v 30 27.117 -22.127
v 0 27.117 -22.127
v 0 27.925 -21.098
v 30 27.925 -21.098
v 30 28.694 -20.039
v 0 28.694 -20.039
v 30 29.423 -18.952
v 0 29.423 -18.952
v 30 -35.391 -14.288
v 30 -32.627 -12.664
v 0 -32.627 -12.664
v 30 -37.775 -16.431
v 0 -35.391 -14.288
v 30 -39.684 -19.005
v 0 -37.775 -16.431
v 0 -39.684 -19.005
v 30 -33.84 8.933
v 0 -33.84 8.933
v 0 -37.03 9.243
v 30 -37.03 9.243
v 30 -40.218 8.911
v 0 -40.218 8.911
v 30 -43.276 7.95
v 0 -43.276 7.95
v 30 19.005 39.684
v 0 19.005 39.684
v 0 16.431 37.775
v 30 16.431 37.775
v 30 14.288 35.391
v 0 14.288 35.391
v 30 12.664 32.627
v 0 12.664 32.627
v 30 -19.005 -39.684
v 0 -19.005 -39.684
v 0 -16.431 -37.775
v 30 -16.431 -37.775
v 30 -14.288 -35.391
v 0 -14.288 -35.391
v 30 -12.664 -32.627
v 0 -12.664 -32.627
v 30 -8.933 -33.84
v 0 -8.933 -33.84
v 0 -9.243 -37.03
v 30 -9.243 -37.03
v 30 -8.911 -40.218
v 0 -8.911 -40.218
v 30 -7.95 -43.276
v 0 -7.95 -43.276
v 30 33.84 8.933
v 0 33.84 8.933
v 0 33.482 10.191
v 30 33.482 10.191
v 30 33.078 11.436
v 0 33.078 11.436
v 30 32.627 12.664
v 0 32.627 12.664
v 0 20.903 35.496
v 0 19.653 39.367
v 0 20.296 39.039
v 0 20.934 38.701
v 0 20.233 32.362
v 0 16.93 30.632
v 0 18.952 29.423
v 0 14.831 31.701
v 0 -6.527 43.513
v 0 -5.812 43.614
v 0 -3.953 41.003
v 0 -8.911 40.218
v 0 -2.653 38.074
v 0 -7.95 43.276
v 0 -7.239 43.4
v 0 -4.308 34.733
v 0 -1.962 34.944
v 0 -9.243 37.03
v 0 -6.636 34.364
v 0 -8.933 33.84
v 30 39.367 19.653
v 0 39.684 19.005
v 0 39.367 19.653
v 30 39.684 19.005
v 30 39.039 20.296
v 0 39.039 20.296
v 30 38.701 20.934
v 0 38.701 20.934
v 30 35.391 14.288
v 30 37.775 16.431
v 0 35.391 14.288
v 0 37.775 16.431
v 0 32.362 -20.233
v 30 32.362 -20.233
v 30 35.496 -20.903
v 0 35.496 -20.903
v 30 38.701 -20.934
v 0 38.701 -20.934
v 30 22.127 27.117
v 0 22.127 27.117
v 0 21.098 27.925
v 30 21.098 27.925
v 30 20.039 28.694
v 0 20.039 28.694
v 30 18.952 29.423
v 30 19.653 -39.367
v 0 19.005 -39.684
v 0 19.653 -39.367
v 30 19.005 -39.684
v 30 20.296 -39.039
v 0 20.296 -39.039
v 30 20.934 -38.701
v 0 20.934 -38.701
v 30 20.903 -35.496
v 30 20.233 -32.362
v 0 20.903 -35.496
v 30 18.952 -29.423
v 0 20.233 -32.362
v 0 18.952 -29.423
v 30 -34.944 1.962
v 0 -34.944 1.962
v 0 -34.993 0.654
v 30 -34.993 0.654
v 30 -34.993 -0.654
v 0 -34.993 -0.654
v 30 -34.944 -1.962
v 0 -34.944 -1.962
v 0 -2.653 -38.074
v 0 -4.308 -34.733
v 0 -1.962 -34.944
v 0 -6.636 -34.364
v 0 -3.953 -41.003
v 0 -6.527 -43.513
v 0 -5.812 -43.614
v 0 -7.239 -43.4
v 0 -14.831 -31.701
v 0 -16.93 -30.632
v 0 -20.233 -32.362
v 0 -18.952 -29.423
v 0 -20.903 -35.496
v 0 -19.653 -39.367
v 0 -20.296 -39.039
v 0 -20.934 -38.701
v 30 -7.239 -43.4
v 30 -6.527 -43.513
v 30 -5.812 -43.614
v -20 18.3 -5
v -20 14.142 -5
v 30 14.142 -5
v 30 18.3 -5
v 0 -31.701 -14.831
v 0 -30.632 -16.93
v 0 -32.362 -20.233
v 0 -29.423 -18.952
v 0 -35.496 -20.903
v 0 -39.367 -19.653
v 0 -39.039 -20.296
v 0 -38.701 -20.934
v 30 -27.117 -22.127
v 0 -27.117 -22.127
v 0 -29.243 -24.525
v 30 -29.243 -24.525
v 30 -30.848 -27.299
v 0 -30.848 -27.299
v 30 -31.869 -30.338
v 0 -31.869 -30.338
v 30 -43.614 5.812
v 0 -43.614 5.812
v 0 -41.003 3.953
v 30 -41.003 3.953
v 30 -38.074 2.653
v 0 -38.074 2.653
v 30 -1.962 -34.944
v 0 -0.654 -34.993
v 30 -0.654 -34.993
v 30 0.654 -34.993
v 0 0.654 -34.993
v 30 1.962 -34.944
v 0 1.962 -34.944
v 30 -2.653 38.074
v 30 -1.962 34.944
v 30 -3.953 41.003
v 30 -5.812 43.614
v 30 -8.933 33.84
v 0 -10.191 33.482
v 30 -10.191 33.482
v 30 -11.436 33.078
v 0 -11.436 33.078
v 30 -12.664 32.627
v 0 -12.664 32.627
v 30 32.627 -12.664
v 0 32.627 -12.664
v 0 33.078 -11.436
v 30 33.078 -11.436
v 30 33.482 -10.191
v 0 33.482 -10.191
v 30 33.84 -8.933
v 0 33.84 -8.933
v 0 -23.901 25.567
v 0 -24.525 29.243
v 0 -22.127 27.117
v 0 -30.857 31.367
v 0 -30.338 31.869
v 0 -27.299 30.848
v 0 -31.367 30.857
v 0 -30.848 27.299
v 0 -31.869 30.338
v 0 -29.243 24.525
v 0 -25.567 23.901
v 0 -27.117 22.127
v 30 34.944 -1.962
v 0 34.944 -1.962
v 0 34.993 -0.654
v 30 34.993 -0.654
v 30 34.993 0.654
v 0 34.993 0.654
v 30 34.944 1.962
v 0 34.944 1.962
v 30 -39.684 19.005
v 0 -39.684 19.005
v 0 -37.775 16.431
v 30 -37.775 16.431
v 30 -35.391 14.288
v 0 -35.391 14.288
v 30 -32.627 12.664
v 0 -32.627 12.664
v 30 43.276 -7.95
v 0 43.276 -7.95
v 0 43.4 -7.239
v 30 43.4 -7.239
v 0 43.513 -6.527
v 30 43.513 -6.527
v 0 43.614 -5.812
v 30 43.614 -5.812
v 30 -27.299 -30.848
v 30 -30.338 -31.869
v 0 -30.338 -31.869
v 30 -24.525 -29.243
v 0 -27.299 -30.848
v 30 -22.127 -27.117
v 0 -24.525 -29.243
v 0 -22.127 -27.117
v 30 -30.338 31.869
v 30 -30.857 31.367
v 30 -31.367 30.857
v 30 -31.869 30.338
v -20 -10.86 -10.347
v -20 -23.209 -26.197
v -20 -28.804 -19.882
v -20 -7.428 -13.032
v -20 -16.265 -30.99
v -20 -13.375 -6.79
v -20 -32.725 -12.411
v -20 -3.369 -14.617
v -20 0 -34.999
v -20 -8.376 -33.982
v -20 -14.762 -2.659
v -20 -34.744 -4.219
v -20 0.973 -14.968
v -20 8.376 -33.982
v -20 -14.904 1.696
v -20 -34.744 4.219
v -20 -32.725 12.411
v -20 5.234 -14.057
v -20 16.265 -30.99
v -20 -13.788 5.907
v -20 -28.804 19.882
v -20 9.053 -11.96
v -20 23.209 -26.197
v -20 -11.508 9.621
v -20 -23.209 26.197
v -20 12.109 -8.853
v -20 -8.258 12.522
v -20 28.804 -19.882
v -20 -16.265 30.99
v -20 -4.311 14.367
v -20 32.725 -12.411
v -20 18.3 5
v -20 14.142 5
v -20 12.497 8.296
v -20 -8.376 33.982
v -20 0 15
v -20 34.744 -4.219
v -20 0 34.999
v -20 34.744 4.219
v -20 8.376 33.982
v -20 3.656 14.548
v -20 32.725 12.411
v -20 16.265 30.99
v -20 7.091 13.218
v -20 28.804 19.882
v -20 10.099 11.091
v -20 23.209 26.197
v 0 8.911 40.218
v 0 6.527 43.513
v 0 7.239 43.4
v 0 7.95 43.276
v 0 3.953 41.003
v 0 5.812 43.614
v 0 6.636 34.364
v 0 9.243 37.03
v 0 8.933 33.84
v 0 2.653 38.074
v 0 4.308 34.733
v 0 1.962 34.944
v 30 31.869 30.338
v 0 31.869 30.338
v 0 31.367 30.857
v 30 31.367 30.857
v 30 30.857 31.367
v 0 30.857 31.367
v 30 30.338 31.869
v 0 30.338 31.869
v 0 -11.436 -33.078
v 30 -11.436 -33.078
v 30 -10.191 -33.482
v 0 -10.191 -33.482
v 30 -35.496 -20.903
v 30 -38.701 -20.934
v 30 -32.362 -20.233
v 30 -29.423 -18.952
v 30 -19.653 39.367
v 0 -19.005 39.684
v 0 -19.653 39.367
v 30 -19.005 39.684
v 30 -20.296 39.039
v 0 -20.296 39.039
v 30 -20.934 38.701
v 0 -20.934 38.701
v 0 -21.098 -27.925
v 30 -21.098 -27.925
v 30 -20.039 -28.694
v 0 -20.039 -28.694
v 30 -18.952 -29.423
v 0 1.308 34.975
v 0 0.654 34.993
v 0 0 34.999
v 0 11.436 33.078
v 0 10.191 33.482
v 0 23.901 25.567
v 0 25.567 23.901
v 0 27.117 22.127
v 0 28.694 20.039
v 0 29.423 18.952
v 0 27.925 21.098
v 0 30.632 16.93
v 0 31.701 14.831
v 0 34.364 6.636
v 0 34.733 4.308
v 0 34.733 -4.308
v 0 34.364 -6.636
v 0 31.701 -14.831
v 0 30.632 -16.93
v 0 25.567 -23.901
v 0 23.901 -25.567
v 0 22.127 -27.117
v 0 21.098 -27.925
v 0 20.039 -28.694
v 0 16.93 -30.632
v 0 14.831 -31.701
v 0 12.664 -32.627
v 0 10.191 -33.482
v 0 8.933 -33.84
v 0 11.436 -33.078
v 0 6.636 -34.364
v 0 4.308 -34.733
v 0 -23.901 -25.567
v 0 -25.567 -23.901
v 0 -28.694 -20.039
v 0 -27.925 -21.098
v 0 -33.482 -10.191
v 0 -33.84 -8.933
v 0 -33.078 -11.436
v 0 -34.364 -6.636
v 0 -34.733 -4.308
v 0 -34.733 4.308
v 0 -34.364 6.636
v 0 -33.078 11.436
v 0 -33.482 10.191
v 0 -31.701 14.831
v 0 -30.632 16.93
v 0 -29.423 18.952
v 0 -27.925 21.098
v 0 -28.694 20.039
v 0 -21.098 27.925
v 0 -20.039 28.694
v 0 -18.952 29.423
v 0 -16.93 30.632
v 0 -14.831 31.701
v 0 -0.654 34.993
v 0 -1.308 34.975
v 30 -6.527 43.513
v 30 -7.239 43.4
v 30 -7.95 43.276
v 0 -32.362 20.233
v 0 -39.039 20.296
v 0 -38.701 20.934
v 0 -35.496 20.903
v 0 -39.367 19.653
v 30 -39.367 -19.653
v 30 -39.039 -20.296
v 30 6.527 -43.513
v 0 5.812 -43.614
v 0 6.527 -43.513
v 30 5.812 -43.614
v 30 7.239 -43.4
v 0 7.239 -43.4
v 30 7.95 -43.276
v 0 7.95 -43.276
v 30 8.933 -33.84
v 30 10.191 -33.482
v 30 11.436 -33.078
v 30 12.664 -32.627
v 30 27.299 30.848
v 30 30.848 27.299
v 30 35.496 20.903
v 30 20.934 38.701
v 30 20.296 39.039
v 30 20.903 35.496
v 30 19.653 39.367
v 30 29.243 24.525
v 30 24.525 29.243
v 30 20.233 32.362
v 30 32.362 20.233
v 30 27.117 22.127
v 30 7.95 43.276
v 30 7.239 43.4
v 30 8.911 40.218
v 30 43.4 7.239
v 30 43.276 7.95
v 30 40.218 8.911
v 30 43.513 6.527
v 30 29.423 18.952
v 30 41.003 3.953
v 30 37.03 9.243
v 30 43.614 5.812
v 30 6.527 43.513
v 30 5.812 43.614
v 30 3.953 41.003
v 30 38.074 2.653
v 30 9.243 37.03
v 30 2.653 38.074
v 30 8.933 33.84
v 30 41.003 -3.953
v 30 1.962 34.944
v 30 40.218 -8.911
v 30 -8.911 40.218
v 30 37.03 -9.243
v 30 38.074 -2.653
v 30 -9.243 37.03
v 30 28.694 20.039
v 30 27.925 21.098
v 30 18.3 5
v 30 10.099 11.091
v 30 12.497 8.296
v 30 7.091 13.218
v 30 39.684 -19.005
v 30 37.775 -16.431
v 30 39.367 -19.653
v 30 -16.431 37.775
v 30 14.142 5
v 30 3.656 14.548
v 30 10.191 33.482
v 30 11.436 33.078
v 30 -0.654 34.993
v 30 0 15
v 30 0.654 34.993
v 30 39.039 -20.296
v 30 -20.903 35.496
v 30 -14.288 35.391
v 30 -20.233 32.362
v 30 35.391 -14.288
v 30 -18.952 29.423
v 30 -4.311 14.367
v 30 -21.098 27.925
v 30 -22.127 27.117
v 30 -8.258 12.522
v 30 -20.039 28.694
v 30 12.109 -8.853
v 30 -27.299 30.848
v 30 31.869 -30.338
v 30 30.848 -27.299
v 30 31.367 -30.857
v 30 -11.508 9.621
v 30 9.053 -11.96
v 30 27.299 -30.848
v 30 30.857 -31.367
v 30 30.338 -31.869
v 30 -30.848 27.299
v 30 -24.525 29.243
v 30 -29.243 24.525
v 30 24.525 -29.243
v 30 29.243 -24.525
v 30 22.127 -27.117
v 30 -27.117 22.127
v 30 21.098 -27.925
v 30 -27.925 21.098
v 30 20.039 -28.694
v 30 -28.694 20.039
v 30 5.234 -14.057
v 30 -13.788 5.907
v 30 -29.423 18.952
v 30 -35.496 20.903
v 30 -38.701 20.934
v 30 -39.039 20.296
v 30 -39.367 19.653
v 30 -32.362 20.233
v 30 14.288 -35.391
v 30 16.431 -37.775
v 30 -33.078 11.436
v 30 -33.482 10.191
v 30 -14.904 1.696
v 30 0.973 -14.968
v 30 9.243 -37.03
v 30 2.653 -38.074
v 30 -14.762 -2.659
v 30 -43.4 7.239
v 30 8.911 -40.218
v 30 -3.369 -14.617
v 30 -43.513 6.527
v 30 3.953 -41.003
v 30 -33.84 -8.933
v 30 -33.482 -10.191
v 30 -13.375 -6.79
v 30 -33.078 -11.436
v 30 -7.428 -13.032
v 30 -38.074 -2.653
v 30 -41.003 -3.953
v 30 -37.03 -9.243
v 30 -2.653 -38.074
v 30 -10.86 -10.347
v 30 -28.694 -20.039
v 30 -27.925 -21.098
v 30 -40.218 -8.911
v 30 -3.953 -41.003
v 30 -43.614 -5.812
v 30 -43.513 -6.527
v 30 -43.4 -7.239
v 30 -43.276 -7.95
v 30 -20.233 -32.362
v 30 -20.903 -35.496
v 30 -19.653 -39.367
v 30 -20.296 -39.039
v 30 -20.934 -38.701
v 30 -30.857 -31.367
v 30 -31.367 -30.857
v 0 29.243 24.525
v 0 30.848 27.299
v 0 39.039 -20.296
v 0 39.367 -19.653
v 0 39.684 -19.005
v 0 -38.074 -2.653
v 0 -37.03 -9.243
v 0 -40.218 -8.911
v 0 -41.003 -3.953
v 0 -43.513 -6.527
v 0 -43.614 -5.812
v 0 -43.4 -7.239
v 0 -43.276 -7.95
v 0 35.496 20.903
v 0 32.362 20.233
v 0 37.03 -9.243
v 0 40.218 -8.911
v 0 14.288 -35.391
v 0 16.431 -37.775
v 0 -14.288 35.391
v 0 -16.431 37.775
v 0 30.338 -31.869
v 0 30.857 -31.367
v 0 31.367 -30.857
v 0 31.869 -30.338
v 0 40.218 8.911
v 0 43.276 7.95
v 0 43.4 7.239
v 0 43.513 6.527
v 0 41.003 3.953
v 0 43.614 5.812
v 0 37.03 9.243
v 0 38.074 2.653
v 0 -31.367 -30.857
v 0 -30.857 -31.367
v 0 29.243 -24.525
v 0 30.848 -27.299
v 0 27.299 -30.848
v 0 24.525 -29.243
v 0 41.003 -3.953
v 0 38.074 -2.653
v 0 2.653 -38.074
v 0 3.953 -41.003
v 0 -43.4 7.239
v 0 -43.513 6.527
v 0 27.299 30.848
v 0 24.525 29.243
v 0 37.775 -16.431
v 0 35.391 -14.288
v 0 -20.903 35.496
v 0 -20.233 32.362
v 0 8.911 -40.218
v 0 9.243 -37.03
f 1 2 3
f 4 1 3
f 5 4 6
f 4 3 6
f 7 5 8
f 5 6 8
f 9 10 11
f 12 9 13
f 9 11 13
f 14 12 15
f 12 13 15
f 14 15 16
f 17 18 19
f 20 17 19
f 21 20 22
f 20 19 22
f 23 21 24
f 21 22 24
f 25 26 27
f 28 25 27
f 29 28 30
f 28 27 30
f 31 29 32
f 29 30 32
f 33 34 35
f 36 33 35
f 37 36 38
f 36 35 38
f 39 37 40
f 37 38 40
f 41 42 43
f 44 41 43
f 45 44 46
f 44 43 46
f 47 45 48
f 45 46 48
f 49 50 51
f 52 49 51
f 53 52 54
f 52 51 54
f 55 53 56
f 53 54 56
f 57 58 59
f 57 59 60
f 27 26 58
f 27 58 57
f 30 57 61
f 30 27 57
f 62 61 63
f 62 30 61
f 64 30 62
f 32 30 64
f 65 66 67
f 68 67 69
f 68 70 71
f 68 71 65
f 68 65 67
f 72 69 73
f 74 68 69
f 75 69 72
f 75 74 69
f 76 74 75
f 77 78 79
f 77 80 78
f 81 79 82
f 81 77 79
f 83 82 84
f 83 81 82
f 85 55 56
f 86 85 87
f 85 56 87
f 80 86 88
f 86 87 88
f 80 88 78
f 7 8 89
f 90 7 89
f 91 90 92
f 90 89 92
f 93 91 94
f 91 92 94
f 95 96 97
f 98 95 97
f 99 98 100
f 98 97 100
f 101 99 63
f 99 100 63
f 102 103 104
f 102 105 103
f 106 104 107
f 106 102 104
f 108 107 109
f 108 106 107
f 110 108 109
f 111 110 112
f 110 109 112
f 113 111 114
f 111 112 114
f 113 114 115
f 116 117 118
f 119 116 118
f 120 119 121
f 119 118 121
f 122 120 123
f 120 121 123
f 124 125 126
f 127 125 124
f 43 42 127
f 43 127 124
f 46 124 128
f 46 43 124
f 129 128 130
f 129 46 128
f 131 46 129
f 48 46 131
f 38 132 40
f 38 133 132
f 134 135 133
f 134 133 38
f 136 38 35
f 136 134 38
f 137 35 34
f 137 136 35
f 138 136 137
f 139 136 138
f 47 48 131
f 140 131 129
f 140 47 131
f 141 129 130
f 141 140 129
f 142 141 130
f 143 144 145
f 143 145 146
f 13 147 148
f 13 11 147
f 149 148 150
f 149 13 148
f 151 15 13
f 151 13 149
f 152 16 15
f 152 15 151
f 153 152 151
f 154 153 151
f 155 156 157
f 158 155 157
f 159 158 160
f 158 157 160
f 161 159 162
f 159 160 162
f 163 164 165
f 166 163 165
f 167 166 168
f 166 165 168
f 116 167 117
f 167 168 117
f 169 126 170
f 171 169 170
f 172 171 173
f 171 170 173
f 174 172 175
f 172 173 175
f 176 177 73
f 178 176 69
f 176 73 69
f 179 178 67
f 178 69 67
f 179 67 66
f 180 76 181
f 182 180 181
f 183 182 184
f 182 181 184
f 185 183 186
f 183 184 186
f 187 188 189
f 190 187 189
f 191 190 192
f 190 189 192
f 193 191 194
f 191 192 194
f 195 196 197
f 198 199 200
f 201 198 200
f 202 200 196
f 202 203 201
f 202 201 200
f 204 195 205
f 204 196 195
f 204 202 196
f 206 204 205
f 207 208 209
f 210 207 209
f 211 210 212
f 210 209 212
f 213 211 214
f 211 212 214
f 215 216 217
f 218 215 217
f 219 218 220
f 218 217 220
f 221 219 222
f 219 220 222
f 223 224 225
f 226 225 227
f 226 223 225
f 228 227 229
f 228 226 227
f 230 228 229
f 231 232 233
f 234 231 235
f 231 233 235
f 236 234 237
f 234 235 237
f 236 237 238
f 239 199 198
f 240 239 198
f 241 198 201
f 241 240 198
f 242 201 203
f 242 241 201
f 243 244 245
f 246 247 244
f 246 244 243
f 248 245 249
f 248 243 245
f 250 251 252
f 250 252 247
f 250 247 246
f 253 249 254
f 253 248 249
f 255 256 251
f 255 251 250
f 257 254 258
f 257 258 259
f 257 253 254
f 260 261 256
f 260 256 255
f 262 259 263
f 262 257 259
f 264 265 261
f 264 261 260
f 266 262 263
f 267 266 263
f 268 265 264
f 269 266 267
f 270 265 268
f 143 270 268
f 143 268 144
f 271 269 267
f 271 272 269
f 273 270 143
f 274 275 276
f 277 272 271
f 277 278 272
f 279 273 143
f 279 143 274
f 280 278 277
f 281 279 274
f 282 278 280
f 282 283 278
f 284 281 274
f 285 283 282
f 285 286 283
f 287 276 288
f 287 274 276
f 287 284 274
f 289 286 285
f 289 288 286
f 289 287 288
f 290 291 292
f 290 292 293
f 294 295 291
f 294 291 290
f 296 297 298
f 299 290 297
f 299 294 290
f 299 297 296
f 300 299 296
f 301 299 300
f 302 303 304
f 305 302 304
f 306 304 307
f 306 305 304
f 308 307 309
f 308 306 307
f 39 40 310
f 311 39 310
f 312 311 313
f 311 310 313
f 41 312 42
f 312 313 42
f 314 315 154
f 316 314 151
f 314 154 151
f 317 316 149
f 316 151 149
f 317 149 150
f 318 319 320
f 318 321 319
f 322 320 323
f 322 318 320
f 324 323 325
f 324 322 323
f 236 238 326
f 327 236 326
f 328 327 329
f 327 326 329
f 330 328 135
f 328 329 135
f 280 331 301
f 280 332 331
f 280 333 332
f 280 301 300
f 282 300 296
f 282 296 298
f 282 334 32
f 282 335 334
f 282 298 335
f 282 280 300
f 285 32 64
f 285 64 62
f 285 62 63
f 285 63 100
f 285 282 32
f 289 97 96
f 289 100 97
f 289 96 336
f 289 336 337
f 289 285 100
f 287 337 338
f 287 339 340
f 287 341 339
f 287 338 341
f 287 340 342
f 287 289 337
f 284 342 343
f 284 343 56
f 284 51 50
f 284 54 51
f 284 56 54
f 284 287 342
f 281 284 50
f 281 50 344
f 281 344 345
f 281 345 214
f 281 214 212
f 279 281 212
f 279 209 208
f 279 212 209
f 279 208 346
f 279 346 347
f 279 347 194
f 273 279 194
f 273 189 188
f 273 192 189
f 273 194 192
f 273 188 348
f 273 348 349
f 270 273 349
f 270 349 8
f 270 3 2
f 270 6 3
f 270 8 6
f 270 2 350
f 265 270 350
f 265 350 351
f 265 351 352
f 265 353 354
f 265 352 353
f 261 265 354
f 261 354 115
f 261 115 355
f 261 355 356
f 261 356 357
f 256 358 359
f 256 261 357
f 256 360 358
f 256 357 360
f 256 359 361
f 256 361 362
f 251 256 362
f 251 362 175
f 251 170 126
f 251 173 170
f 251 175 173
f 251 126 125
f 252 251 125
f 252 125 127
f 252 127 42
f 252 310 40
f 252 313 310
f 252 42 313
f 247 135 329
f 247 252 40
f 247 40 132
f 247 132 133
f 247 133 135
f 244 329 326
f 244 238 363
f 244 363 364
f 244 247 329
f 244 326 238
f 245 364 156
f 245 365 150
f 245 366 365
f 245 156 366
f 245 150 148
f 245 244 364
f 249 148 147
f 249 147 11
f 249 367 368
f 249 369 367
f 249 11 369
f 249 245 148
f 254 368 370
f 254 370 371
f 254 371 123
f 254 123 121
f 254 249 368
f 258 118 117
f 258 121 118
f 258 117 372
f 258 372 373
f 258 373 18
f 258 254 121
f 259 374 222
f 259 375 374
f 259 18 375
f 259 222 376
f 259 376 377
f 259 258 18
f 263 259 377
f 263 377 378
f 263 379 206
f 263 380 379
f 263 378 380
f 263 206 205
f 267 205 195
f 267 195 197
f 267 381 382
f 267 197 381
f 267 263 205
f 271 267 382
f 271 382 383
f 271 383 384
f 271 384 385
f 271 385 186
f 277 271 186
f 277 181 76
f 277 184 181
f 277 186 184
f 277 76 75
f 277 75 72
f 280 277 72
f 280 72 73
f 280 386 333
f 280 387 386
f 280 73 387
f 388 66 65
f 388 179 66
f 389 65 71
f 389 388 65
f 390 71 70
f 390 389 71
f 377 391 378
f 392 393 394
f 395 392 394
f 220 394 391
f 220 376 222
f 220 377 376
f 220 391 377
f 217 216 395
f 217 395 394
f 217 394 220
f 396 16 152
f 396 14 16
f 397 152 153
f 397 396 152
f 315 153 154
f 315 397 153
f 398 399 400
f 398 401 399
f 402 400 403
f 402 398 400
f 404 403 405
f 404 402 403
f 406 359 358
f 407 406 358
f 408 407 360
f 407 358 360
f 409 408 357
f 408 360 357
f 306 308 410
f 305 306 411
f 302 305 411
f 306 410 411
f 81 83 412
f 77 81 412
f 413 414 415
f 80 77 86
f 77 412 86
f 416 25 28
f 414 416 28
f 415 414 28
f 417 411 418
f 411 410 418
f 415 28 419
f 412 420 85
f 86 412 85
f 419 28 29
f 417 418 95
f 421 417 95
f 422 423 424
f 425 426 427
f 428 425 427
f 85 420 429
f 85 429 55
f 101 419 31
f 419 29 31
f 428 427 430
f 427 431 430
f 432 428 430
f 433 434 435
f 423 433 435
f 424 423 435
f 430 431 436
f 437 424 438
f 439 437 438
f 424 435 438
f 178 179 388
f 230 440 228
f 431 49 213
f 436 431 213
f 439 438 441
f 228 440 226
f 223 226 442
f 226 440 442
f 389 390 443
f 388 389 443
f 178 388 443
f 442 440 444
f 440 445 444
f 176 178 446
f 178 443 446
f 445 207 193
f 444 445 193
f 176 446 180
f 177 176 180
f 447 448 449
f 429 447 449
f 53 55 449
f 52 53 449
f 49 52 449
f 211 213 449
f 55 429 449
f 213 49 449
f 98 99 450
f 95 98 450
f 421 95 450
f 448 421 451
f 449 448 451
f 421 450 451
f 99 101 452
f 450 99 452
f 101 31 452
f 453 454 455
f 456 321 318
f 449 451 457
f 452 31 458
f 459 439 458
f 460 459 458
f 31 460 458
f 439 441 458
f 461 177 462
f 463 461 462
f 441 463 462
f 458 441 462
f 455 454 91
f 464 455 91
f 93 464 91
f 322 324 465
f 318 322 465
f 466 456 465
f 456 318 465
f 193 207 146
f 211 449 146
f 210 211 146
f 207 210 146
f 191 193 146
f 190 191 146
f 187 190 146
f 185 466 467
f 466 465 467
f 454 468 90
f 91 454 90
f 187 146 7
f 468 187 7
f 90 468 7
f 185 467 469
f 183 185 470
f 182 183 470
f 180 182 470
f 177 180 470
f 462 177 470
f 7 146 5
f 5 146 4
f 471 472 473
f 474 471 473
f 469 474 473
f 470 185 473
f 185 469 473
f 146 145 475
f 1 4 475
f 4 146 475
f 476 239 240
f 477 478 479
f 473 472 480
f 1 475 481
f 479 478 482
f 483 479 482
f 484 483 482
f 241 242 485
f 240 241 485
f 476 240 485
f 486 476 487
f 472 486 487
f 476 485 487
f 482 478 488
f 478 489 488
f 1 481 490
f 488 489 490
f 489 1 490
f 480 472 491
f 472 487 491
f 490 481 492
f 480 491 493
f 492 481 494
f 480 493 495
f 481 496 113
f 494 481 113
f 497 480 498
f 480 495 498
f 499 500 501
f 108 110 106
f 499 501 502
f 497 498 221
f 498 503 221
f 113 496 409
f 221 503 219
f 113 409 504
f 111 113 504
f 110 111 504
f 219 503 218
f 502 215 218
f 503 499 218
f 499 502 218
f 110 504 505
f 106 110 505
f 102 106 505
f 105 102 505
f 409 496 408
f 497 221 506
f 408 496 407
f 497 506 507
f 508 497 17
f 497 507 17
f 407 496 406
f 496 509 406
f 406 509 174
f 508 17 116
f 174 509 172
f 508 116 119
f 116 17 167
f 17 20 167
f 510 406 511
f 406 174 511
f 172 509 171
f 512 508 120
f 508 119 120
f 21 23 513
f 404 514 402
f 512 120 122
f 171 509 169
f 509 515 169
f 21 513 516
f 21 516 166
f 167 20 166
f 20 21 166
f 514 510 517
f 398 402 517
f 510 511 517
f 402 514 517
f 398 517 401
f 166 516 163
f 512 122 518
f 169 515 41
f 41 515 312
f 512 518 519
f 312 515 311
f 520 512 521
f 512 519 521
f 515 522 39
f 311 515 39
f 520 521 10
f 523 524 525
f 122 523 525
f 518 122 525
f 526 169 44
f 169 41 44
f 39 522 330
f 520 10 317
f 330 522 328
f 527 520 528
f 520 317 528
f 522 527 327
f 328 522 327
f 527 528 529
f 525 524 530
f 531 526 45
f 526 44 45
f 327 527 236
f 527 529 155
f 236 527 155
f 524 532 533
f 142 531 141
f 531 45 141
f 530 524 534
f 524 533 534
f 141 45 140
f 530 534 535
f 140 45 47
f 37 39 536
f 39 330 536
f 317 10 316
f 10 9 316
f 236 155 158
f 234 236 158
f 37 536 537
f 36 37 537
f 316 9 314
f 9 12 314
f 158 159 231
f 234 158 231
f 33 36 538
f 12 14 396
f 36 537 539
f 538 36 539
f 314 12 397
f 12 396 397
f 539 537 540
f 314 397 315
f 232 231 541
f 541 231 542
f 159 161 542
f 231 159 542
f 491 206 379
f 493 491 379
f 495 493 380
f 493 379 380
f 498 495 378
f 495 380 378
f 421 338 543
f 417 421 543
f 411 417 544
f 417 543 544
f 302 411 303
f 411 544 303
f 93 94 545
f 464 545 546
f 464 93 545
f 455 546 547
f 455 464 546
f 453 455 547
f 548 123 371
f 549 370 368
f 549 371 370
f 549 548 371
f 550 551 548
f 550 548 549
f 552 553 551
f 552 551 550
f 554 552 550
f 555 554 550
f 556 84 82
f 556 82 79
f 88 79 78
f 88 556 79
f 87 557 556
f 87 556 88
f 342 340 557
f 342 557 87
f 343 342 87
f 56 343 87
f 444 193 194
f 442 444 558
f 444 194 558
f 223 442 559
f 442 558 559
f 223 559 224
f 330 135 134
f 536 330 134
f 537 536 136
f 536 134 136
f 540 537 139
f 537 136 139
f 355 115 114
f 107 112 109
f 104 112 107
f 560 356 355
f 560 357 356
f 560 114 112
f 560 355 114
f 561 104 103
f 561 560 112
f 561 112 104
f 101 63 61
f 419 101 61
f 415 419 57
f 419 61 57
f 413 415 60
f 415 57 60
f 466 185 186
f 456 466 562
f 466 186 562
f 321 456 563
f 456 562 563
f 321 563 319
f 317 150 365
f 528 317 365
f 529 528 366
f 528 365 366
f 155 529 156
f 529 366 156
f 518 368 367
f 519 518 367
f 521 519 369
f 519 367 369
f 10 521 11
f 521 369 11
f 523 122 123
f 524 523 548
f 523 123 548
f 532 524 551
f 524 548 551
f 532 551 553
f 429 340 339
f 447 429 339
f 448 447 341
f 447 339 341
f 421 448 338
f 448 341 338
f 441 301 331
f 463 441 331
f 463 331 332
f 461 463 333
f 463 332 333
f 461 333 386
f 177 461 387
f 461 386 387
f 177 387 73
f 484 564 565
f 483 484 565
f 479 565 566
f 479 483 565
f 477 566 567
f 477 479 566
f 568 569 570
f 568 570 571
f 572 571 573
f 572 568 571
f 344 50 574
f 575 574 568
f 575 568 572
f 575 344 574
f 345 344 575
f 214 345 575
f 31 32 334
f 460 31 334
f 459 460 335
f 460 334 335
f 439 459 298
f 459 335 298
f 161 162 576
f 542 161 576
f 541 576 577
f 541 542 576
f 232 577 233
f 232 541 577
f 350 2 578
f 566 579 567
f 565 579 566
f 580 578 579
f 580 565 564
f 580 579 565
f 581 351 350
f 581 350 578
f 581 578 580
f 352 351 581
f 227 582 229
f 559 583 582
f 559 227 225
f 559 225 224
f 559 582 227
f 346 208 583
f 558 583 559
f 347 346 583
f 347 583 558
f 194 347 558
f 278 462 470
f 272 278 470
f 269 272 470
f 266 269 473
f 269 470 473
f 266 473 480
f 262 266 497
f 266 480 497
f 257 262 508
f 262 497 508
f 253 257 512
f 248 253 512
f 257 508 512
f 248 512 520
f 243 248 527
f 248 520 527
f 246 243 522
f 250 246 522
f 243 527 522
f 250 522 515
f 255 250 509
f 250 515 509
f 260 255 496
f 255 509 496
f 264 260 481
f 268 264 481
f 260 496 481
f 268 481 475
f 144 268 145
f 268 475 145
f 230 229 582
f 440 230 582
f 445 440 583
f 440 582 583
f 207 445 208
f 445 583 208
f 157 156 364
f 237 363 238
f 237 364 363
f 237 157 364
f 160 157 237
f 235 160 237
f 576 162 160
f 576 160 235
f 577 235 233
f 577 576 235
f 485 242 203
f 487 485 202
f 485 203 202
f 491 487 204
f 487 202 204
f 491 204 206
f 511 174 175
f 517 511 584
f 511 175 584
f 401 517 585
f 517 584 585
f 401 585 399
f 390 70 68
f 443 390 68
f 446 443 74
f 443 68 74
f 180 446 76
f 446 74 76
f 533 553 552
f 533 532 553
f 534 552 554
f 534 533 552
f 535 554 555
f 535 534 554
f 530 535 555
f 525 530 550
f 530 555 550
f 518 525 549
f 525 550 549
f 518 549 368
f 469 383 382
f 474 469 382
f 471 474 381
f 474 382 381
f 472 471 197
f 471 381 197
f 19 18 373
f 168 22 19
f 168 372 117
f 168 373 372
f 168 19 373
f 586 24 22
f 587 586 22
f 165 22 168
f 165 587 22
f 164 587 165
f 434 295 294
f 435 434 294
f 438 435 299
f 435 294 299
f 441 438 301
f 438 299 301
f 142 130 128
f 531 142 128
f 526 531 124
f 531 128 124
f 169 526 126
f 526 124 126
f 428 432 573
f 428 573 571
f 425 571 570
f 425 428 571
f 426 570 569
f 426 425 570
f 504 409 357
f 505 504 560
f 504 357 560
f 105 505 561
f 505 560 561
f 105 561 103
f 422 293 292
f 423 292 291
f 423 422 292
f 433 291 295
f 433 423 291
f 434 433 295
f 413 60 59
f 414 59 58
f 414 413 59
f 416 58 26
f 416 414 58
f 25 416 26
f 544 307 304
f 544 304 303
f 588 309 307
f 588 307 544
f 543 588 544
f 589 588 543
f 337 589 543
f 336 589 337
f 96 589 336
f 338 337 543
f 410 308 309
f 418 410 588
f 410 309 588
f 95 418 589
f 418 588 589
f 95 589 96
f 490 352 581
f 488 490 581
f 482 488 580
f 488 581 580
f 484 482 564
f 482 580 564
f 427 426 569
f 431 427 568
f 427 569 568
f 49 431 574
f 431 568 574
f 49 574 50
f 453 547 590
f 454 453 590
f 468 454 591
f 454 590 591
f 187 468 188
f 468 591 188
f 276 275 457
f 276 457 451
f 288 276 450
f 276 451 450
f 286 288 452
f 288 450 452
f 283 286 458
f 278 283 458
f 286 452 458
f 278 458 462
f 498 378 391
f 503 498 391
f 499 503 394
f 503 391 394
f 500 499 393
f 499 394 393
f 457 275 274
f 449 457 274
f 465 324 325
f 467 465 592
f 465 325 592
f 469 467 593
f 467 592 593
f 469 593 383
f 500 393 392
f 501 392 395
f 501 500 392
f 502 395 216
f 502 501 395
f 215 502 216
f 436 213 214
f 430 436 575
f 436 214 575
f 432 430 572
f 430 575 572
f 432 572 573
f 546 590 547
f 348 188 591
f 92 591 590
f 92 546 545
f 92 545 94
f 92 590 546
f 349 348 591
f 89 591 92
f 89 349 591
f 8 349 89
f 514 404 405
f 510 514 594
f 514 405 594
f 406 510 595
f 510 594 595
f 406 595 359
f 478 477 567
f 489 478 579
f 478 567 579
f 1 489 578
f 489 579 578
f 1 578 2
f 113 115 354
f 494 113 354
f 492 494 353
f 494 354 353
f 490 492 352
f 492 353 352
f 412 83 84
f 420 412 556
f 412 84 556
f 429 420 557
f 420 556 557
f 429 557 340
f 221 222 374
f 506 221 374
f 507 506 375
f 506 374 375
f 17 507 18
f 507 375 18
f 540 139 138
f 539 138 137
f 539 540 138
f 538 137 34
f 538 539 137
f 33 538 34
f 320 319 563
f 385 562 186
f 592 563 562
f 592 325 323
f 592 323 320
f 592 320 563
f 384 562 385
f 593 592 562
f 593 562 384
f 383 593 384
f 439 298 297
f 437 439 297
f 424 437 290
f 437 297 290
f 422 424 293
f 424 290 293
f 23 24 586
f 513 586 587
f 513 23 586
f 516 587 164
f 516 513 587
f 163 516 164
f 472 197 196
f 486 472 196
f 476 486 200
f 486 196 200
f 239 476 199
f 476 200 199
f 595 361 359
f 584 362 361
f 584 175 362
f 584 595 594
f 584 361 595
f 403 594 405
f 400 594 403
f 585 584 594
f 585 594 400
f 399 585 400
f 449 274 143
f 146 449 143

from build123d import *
from build123d.topology import SkipClean

# Parameters (mm, degrees)
BASPROSKE_W      = 30
BASPROSKE_H      = 44
TOOTHCUT_DEPTH   = 70.079664157
TEETHCUTS_COUNT  = 20
TEETHCUTS_ANGLE  = 342
HUBNEARONE_START = 20.0000508
HUBNEAONESKE_R   = 34.999
HUBNEARONE_DEPTH = 20.0000508
BORSKE_R         = 15
BORE_DEPTH       = 50.0000508
KEYSKE_W         = 10
KEYSKE_H         = 18.3
KEYWAY_DEPTH     = 50.0000508


with BuildPart() as part:
    # BasProSke → Base-Revolve (revolve)
    with BuildSketch(Plane(origin=(0, 0, 0), x_dir=(1, 0, 0), z_dir=(0, 1, 0)), mode=Mode.PRIVATE) as base_revolve_sk:
        with Locations((15, 22)):
            Rectangle(BASPROSKE_W, BASPROSKE_H)
    revolve(base_revolve_sk.sketch.rotate(Axis((-10, 0, 0), (1, 0, 0)), 180), axis=Axis((-10, 0, 0), (1, 0, 0)))

    # TooCutSke → ToothCut (cut, through all)
    with BuildSketch(Plane(origin=(0, 0, 0), x_dir=(0, 0, -1), z_dir=(1, 0, 0))):
        with BuildLine():
            ThreePointArc((1.961730392, 34.943978235), (0, 34.999), (-1.961730392, 34.943978235))
            ThreePointArc((-1.961730392, 34.943978235), (-3.235659864, 39.585086827), (-5.832115241, 43.637395396))
            ThreePointArc((-5.832115241, 43.637395396), (0, 44.0254), (5.832115241, 43.637395396))
            ThreePointArc((5.832115241, 43.637395396), (3.235659864, 39.585086827), (1.961730392, 34.943978235))
        make_face()
    toothcut = extrude(amount=TOOTHCUT_DEPTH, mode=Mode.SUBTRACT)

    # TeethCuts: ToothCut ×20 about axis
    teethcuts_axis = Axis((-10, 0, 0), (1, 0, 0))
    for i in range(1, TEETHCUTS_COUNT):
        add(toothcut.rotate(teethcuts_axis, i * TEETHCUTS_ANGLE / (TEETHCUTS_COUNT - 1)), mode=Mode.SUBTRACT)

    # HubNeaOneSke → HubNearOne (add)
    with SkipClean():  # the faces are left unmerged after this step: merging them gives an invalid solid
        with BuildSketch(Plane.ZY.offset(HUBNEARONE_START)):
            Circle(HUBNEAONESKE_R)
        extrude(amount=-HUBNEARONE_DEPTH)

    # BorSke → Bore (cut, symmetric)
    with SkipClean():  # the faces are left unmerged after this step: merging them gives an invalid solid
        with BuildSketch(Plane(origin=(0, 0, 0), x_dir=(0, 0, -1), z_dir=(1, 0, 0))):
            with Locations(Location((0, 0, 0), (0, 0, 180))):
                Circle(BORSKE_R)
        extrude(amount=BORE_DEPTH, both=True, mode=Mode.SUBTRACT)

    # KeySke → Keyway (cut, symmetric)
    with SkipClean():  # the faces are left unmerged after this step: merging them gives an invalid solid
        with BuildSketch(Plane(origin=(0, 0, 0), x_dir=(0, 0, -1), z_dir=(1, 0, 0))):
            with Locations((0, 9.15)):
                Rectangle(KEYSKE_W, KEYSKE_H)
        extrude(amount=KEYWAY_DEPTH, both=True, mode=Mode.SUBTRACT)


solid = part.part
